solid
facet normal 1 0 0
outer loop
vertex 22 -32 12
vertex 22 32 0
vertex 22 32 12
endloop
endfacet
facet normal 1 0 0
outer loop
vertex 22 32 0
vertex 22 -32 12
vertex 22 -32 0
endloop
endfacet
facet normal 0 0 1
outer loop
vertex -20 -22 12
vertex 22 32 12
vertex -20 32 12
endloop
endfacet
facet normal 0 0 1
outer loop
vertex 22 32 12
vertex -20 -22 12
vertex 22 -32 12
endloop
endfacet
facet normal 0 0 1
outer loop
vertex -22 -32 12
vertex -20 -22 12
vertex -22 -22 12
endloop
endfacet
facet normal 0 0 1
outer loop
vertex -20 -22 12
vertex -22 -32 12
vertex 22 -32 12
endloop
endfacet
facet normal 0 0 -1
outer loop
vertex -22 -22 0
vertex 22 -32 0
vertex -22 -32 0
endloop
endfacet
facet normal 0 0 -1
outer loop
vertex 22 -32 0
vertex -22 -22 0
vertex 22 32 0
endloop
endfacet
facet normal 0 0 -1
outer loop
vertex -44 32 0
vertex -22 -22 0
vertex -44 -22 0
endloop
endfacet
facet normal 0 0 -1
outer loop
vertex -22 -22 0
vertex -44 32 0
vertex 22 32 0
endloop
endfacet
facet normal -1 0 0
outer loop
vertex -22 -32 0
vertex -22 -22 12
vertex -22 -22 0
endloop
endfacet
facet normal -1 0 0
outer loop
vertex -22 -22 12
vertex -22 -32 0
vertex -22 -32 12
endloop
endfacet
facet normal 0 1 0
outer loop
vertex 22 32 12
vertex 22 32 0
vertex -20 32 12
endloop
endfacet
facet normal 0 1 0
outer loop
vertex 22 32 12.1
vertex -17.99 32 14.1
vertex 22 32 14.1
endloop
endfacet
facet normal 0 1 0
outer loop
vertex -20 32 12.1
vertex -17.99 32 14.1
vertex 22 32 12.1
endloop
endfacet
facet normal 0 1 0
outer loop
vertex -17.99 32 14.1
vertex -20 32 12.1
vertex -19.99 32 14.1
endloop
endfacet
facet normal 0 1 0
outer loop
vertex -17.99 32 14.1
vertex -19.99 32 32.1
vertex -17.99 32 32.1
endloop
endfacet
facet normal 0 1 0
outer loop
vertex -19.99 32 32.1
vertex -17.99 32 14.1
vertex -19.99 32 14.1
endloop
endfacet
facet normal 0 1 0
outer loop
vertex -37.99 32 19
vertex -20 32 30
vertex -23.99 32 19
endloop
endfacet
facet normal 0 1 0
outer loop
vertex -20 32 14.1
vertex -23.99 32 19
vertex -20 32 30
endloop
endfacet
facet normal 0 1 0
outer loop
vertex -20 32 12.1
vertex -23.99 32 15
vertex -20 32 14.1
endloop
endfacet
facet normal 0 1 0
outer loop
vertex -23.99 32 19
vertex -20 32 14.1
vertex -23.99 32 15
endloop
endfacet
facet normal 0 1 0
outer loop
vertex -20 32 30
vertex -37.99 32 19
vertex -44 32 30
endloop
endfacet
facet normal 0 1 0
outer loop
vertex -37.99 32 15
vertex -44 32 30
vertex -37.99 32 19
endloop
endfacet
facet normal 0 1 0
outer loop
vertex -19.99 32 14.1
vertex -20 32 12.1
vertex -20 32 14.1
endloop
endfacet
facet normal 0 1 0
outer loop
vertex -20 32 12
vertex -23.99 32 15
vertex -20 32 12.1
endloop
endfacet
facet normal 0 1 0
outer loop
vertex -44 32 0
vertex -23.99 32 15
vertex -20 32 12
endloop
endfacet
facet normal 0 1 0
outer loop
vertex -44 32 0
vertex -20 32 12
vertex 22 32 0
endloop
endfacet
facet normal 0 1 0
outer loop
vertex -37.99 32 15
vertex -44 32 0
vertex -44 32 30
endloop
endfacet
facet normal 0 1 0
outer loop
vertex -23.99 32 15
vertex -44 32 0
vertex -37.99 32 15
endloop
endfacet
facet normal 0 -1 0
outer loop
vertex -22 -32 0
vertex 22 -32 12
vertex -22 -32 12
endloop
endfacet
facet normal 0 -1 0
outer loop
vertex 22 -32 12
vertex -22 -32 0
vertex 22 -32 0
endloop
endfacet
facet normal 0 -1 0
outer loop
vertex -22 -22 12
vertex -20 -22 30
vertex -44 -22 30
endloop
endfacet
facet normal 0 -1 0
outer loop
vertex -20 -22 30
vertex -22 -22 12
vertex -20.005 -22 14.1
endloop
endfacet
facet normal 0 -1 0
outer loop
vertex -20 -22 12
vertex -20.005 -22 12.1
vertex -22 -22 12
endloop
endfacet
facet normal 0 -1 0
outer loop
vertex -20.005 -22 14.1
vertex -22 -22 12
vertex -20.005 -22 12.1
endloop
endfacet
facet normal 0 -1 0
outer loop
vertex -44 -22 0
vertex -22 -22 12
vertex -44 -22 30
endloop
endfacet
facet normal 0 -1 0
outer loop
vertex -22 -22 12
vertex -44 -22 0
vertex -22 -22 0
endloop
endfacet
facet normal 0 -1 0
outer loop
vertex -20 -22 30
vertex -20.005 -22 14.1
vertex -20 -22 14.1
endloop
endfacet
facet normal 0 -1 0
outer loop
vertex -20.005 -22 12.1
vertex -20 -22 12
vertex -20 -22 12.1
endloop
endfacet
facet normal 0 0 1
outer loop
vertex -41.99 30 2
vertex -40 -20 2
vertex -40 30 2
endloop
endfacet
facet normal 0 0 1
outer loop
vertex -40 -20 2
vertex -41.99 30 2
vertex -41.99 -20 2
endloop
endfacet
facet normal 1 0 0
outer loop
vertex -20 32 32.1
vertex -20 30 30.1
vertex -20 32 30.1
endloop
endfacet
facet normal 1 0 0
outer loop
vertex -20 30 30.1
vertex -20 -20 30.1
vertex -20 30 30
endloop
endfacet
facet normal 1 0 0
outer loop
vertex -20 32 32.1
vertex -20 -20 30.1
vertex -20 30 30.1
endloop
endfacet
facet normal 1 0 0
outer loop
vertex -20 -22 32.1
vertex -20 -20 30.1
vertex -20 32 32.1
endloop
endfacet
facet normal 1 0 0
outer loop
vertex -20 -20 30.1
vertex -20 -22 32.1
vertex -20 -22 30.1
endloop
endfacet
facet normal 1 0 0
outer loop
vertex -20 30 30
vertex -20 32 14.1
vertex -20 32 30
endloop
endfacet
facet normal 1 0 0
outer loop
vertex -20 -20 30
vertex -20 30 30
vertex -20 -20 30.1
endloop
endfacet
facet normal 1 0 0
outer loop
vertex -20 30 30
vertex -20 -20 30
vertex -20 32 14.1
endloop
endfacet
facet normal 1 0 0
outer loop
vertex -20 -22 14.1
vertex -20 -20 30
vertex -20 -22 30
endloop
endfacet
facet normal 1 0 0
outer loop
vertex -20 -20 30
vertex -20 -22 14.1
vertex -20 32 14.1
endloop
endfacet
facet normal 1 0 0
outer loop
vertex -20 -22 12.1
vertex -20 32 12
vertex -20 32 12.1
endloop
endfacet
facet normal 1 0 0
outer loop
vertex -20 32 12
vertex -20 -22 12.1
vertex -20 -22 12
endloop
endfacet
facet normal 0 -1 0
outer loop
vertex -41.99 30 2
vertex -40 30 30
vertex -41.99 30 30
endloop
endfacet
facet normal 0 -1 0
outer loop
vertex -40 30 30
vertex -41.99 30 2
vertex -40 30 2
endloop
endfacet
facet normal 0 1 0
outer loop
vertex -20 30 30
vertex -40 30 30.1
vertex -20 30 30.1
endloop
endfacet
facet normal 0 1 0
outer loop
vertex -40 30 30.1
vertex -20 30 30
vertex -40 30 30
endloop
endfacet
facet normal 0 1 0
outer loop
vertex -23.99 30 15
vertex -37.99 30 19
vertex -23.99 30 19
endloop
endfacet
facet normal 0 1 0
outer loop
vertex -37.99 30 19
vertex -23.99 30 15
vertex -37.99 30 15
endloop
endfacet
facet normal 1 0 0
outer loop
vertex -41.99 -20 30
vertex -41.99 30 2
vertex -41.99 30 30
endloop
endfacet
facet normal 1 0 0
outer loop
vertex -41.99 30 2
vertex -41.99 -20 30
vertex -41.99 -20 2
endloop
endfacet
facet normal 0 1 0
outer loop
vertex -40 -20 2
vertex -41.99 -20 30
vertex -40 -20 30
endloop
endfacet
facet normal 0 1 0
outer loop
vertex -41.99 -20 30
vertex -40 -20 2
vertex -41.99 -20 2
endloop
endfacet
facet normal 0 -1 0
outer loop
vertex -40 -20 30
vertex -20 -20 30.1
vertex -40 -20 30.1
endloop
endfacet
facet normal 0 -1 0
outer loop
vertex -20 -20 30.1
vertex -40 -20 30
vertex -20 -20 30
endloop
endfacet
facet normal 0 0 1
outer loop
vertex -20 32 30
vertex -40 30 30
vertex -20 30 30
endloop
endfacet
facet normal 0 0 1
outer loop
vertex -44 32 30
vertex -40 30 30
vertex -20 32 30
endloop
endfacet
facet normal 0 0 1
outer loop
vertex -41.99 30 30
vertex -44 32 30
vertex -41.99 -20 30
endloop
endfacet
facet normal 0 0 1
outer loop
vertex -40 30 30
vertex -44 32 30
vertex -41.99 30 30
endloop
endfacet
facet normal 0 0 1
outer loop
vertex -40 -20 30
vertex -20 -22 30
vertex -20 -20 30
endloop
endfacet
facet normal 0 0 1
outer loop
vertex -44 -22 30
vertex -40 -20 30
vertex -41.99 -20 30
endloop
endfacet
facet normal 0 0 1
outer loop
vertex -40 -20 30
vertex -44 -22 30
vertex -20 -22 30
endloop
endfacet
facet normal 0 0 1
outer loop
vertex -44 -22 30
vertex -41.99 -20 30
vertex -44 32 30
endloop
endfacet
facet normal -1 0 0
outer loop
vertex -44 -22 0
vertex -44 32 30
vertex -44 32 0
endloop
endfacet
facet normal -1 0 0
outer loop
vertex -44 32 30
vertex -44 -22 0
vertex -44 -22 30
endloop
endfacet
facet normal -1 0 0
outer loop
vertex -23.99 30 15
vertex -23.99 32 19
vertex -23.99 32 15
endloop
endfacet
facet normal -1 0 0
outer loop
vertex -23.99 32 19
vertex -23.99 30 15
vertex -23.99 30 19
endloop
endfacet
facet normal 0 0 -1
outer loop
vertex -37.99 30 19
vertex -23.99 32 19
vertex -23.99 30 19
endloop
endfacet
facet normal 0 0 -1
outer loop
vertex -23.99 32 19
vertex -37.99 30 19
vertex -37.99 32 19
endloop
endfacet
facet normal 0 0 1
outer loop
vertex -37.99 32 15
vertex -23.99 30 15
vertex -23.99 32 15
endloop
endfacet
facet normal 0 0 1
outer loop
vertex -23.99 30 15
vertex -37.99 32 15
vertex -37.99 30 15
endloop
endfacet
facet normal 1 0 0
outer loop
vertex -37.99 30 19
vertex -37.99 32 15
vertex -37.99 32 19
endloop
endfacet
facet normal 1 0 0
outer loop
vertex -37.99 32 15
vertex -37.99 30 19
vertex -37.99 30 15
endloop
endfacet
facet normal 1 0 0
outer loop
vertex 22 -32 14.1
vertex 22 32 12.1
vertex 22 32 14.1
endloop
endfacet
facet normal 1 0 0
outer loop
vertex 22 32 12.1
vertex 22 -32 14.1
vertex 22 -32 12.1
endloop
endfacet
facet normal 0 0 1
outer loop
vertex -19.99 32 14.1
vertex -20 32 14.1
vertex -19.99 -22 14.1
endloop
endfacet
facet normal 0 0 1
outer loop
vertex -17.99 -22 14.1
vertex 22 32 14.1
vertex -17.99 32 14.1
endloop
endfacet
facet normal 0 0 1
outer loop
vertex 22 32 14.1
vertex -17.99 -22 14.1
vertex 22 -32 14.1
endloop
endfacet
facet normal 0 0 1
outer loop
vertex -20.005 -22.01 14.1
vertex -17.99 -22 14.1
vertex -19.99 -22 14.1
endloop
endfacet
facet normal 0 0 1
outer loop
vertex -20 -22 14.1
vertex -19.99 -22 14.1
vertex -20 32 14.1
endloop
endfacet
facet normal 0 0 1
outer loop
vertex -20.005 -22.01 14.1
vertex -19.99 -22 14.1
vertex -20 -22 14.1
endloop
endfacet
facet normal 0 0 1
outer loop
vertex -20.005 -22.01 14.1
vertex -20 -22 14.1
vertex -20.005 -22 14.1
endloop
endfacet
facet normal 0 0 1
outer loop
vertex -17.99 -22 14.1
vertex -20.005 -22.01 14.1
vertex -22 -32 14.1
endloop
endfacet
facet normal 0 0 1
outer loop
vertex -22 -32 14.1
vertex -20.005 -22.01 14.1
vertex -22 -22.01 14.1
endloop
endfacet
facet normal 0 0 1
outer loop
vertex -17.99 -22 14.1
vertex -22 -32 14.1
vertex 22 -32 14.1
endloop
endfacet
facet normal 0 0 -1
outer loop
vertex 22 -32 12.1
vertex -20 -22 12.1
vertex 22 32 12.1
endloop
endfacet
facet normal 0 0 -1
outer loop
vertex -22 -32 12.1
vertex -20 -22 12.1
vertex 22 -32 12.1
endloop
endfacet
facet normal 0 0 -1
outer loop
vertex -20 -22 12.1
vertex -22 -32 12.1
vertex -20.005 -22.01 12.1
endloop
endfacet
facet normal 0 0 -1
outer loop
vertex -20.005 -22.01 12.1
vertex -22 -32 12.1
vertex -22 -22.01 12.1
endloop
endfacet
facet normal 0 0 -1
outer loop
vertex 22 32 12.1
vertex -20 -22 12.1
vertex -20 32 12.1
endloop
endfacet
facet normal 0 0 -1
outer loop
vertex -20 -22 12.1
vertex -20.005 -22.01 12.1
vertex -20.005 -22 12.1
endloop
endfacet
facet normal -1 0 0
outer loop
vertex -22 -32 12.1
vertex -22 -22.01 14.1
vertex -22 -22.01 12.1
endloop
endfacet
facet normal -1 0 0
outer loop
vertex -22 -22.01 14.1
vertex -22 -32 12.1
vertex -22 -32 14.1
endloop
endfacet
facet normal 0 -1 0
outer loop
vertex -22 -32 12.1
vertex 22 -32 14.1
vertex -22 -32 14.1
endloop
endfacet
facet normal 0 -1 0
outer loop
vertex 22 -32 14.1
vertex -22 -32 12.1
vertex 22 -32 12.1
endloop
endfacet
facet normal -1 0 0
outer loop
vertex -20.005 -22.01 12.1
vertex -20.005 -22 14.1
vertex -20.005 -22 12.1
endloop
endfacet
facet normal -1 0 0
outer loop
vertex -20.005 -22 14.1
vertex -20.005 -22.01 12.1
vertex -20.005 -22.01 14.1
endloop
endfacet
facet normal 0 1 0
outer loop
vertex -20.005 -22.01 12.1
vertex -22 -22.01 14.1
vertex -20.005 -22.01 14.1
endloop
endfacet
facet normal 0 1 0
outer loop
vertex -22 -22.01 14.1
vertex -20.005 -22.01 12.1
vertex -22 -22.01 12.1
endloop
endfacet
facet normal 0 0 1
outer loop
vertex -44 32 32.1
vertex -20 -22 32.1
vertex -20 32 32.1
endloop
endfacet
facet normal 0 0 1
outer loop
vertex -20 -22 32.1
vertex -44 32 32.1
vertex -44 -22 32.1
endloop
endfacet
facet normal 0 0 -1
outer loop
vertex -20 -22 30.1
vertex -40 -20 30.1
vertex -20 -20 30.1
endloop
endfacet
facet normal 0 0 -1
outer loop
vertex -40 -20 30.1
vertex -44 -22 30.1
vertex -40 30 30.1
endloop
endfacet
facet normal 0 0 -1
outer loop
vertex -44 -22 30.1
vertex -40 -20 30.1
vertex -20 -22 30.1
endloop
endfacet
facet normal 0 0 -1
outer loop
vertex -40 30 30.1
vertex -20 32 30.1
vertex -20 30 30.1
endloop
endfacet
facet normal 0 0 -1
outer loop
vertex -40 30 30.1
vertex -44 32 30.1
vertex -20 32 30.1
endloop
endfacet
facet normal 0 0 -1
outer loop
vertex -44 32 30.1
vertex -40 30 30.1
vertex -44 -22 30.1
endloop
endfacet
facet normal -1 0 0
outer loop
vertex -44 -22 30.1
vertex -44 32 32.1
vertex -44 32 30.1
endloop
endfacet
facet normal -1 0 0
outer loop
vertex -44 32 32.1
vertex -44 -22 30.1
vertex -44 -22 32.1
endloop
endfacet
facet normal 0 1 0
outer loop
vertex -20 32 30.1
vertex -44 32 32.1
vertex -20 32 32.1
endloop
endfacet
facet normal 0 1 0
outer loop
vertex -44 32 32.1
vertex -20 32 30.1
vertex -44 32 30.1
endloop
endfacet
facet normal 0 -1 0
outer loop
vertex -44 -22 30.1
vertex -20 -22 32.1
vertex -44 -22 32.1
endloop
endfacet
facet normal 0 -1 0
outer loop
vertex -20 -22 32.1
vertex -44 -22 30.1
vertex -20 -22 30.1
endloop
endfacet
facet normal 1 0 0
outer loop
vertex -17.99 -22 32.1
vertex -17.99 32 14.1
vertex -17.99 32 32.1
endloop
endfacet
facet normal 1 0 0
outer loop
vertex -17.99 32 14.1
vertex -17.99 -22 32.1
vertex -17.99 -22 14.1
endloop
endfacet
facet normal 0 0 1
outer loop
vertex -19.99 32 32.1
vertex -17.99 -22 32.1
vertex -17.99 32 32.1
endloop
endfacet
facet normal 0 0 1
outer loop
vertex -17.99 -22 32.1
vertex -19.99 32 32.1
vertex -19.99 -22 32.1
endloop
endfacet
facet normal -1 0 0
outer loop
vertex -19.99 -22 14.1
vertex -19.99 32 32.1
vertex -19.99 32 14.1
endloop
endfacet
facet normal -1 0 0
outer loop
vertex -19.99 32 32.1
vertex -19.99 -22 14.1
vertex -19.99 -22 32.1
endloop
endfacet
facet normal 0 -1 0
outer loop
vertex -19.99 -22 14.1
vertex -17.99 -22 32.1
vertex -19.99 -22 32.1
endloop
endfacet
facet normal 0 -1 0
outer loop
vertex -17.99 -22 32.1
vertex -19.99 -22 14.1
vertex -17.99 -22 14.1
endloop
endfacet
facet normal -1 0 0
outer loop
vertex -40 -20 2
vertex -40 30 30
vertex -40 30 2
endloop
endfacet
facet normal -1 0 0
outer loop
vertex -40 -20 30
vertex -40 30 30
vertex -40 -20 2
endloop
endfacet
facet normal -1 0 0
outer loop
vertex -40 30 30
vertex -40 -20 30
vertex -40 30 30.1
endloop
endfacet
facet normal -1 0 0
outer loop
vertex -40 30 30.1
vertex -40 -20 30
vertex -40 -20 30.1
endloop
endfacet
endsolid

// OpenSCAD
$fn = 16;
wallThickness = 2;

base(wallThickness);

module base(thickness) {
    union() {
        difference() {
            union() {
                translate([0,0,5+thickness/2])
                cube([40+thickness*2,60+thickness*2,10+thickness], center = true);
                translate([-30,5,5+thickness/2])
                cube([20+thickness*2,50+thickness*2,10+thickness], center = true);
            }
            translate([0,0,5+thickness/2+thickness])
            cube([40,60,10+thickness], center = true);
            translate([-30+0.01-thickness/2,5,5+thickness/2+thickness])
            cube([20+thickness,50,10+thickness], center = true);
        }
        difference() {
            translate([-30-thickness,5,15])
            cube([20+thickness*2,50+thickness*2,30], center = true);
            
            translate([-29.99+thickness/2-thickness,5,15])
            cube([20+thickness,50,31], center = true);
            
            translate([-30+0.01-thickness/2,25+thickness*2,28-11])
            cube([14,thickness*10,4], center = true);
        }
        
        //RFID PINS
        translate([20-1.3-1.2,30-1.3-14,0])
        cylinder(r = 1.3, h = 10);
        mirror([1,0,0])
        translate([20-1.3-1.2,30-1.3-14,0])
        cylinder(r = 1.3, h = 10);

        translate([20-1.3-6,-30+1.3+6,0])
        cylinder(r = 1.3, h = 10);
        mirror([1,0,0])
        translate([20-1.3-6,-30+1.3+6,0])
        cylinder(r = 1.3, h = 10);
    }

    translate([0,0,0.1]) {
        difference() {
            translate([0,0,10+thickness/2+thickness])
            cube([40+thickness*2,60+thickness*2,thickness], center = true);
            translate([-21-0.01,5,11.01+thickness/2])
            cube([thickness+0.01,50.02+thickness*2,thickness*2], center = true);
        }
        translate([-30-thickness,5,30+thickness/2])
        cube([20+thickness*2,50+thickness*2,thickness], center = true);
        
        translate([-21+0.01+thickness,5,21+thickness/2])
        cube([thickness,50+thickness*2,18+thickness], center = true);
    }
}

color([0.3,0.3,0.3])
translate([0,0,wallThickness]) {
    //RFID
    translate([0,0,5])
    cube([40,60,10], center = true);
    //ARDUINO
    translate([-30,5,15])
    cube([20,50,30], center = true);
}
